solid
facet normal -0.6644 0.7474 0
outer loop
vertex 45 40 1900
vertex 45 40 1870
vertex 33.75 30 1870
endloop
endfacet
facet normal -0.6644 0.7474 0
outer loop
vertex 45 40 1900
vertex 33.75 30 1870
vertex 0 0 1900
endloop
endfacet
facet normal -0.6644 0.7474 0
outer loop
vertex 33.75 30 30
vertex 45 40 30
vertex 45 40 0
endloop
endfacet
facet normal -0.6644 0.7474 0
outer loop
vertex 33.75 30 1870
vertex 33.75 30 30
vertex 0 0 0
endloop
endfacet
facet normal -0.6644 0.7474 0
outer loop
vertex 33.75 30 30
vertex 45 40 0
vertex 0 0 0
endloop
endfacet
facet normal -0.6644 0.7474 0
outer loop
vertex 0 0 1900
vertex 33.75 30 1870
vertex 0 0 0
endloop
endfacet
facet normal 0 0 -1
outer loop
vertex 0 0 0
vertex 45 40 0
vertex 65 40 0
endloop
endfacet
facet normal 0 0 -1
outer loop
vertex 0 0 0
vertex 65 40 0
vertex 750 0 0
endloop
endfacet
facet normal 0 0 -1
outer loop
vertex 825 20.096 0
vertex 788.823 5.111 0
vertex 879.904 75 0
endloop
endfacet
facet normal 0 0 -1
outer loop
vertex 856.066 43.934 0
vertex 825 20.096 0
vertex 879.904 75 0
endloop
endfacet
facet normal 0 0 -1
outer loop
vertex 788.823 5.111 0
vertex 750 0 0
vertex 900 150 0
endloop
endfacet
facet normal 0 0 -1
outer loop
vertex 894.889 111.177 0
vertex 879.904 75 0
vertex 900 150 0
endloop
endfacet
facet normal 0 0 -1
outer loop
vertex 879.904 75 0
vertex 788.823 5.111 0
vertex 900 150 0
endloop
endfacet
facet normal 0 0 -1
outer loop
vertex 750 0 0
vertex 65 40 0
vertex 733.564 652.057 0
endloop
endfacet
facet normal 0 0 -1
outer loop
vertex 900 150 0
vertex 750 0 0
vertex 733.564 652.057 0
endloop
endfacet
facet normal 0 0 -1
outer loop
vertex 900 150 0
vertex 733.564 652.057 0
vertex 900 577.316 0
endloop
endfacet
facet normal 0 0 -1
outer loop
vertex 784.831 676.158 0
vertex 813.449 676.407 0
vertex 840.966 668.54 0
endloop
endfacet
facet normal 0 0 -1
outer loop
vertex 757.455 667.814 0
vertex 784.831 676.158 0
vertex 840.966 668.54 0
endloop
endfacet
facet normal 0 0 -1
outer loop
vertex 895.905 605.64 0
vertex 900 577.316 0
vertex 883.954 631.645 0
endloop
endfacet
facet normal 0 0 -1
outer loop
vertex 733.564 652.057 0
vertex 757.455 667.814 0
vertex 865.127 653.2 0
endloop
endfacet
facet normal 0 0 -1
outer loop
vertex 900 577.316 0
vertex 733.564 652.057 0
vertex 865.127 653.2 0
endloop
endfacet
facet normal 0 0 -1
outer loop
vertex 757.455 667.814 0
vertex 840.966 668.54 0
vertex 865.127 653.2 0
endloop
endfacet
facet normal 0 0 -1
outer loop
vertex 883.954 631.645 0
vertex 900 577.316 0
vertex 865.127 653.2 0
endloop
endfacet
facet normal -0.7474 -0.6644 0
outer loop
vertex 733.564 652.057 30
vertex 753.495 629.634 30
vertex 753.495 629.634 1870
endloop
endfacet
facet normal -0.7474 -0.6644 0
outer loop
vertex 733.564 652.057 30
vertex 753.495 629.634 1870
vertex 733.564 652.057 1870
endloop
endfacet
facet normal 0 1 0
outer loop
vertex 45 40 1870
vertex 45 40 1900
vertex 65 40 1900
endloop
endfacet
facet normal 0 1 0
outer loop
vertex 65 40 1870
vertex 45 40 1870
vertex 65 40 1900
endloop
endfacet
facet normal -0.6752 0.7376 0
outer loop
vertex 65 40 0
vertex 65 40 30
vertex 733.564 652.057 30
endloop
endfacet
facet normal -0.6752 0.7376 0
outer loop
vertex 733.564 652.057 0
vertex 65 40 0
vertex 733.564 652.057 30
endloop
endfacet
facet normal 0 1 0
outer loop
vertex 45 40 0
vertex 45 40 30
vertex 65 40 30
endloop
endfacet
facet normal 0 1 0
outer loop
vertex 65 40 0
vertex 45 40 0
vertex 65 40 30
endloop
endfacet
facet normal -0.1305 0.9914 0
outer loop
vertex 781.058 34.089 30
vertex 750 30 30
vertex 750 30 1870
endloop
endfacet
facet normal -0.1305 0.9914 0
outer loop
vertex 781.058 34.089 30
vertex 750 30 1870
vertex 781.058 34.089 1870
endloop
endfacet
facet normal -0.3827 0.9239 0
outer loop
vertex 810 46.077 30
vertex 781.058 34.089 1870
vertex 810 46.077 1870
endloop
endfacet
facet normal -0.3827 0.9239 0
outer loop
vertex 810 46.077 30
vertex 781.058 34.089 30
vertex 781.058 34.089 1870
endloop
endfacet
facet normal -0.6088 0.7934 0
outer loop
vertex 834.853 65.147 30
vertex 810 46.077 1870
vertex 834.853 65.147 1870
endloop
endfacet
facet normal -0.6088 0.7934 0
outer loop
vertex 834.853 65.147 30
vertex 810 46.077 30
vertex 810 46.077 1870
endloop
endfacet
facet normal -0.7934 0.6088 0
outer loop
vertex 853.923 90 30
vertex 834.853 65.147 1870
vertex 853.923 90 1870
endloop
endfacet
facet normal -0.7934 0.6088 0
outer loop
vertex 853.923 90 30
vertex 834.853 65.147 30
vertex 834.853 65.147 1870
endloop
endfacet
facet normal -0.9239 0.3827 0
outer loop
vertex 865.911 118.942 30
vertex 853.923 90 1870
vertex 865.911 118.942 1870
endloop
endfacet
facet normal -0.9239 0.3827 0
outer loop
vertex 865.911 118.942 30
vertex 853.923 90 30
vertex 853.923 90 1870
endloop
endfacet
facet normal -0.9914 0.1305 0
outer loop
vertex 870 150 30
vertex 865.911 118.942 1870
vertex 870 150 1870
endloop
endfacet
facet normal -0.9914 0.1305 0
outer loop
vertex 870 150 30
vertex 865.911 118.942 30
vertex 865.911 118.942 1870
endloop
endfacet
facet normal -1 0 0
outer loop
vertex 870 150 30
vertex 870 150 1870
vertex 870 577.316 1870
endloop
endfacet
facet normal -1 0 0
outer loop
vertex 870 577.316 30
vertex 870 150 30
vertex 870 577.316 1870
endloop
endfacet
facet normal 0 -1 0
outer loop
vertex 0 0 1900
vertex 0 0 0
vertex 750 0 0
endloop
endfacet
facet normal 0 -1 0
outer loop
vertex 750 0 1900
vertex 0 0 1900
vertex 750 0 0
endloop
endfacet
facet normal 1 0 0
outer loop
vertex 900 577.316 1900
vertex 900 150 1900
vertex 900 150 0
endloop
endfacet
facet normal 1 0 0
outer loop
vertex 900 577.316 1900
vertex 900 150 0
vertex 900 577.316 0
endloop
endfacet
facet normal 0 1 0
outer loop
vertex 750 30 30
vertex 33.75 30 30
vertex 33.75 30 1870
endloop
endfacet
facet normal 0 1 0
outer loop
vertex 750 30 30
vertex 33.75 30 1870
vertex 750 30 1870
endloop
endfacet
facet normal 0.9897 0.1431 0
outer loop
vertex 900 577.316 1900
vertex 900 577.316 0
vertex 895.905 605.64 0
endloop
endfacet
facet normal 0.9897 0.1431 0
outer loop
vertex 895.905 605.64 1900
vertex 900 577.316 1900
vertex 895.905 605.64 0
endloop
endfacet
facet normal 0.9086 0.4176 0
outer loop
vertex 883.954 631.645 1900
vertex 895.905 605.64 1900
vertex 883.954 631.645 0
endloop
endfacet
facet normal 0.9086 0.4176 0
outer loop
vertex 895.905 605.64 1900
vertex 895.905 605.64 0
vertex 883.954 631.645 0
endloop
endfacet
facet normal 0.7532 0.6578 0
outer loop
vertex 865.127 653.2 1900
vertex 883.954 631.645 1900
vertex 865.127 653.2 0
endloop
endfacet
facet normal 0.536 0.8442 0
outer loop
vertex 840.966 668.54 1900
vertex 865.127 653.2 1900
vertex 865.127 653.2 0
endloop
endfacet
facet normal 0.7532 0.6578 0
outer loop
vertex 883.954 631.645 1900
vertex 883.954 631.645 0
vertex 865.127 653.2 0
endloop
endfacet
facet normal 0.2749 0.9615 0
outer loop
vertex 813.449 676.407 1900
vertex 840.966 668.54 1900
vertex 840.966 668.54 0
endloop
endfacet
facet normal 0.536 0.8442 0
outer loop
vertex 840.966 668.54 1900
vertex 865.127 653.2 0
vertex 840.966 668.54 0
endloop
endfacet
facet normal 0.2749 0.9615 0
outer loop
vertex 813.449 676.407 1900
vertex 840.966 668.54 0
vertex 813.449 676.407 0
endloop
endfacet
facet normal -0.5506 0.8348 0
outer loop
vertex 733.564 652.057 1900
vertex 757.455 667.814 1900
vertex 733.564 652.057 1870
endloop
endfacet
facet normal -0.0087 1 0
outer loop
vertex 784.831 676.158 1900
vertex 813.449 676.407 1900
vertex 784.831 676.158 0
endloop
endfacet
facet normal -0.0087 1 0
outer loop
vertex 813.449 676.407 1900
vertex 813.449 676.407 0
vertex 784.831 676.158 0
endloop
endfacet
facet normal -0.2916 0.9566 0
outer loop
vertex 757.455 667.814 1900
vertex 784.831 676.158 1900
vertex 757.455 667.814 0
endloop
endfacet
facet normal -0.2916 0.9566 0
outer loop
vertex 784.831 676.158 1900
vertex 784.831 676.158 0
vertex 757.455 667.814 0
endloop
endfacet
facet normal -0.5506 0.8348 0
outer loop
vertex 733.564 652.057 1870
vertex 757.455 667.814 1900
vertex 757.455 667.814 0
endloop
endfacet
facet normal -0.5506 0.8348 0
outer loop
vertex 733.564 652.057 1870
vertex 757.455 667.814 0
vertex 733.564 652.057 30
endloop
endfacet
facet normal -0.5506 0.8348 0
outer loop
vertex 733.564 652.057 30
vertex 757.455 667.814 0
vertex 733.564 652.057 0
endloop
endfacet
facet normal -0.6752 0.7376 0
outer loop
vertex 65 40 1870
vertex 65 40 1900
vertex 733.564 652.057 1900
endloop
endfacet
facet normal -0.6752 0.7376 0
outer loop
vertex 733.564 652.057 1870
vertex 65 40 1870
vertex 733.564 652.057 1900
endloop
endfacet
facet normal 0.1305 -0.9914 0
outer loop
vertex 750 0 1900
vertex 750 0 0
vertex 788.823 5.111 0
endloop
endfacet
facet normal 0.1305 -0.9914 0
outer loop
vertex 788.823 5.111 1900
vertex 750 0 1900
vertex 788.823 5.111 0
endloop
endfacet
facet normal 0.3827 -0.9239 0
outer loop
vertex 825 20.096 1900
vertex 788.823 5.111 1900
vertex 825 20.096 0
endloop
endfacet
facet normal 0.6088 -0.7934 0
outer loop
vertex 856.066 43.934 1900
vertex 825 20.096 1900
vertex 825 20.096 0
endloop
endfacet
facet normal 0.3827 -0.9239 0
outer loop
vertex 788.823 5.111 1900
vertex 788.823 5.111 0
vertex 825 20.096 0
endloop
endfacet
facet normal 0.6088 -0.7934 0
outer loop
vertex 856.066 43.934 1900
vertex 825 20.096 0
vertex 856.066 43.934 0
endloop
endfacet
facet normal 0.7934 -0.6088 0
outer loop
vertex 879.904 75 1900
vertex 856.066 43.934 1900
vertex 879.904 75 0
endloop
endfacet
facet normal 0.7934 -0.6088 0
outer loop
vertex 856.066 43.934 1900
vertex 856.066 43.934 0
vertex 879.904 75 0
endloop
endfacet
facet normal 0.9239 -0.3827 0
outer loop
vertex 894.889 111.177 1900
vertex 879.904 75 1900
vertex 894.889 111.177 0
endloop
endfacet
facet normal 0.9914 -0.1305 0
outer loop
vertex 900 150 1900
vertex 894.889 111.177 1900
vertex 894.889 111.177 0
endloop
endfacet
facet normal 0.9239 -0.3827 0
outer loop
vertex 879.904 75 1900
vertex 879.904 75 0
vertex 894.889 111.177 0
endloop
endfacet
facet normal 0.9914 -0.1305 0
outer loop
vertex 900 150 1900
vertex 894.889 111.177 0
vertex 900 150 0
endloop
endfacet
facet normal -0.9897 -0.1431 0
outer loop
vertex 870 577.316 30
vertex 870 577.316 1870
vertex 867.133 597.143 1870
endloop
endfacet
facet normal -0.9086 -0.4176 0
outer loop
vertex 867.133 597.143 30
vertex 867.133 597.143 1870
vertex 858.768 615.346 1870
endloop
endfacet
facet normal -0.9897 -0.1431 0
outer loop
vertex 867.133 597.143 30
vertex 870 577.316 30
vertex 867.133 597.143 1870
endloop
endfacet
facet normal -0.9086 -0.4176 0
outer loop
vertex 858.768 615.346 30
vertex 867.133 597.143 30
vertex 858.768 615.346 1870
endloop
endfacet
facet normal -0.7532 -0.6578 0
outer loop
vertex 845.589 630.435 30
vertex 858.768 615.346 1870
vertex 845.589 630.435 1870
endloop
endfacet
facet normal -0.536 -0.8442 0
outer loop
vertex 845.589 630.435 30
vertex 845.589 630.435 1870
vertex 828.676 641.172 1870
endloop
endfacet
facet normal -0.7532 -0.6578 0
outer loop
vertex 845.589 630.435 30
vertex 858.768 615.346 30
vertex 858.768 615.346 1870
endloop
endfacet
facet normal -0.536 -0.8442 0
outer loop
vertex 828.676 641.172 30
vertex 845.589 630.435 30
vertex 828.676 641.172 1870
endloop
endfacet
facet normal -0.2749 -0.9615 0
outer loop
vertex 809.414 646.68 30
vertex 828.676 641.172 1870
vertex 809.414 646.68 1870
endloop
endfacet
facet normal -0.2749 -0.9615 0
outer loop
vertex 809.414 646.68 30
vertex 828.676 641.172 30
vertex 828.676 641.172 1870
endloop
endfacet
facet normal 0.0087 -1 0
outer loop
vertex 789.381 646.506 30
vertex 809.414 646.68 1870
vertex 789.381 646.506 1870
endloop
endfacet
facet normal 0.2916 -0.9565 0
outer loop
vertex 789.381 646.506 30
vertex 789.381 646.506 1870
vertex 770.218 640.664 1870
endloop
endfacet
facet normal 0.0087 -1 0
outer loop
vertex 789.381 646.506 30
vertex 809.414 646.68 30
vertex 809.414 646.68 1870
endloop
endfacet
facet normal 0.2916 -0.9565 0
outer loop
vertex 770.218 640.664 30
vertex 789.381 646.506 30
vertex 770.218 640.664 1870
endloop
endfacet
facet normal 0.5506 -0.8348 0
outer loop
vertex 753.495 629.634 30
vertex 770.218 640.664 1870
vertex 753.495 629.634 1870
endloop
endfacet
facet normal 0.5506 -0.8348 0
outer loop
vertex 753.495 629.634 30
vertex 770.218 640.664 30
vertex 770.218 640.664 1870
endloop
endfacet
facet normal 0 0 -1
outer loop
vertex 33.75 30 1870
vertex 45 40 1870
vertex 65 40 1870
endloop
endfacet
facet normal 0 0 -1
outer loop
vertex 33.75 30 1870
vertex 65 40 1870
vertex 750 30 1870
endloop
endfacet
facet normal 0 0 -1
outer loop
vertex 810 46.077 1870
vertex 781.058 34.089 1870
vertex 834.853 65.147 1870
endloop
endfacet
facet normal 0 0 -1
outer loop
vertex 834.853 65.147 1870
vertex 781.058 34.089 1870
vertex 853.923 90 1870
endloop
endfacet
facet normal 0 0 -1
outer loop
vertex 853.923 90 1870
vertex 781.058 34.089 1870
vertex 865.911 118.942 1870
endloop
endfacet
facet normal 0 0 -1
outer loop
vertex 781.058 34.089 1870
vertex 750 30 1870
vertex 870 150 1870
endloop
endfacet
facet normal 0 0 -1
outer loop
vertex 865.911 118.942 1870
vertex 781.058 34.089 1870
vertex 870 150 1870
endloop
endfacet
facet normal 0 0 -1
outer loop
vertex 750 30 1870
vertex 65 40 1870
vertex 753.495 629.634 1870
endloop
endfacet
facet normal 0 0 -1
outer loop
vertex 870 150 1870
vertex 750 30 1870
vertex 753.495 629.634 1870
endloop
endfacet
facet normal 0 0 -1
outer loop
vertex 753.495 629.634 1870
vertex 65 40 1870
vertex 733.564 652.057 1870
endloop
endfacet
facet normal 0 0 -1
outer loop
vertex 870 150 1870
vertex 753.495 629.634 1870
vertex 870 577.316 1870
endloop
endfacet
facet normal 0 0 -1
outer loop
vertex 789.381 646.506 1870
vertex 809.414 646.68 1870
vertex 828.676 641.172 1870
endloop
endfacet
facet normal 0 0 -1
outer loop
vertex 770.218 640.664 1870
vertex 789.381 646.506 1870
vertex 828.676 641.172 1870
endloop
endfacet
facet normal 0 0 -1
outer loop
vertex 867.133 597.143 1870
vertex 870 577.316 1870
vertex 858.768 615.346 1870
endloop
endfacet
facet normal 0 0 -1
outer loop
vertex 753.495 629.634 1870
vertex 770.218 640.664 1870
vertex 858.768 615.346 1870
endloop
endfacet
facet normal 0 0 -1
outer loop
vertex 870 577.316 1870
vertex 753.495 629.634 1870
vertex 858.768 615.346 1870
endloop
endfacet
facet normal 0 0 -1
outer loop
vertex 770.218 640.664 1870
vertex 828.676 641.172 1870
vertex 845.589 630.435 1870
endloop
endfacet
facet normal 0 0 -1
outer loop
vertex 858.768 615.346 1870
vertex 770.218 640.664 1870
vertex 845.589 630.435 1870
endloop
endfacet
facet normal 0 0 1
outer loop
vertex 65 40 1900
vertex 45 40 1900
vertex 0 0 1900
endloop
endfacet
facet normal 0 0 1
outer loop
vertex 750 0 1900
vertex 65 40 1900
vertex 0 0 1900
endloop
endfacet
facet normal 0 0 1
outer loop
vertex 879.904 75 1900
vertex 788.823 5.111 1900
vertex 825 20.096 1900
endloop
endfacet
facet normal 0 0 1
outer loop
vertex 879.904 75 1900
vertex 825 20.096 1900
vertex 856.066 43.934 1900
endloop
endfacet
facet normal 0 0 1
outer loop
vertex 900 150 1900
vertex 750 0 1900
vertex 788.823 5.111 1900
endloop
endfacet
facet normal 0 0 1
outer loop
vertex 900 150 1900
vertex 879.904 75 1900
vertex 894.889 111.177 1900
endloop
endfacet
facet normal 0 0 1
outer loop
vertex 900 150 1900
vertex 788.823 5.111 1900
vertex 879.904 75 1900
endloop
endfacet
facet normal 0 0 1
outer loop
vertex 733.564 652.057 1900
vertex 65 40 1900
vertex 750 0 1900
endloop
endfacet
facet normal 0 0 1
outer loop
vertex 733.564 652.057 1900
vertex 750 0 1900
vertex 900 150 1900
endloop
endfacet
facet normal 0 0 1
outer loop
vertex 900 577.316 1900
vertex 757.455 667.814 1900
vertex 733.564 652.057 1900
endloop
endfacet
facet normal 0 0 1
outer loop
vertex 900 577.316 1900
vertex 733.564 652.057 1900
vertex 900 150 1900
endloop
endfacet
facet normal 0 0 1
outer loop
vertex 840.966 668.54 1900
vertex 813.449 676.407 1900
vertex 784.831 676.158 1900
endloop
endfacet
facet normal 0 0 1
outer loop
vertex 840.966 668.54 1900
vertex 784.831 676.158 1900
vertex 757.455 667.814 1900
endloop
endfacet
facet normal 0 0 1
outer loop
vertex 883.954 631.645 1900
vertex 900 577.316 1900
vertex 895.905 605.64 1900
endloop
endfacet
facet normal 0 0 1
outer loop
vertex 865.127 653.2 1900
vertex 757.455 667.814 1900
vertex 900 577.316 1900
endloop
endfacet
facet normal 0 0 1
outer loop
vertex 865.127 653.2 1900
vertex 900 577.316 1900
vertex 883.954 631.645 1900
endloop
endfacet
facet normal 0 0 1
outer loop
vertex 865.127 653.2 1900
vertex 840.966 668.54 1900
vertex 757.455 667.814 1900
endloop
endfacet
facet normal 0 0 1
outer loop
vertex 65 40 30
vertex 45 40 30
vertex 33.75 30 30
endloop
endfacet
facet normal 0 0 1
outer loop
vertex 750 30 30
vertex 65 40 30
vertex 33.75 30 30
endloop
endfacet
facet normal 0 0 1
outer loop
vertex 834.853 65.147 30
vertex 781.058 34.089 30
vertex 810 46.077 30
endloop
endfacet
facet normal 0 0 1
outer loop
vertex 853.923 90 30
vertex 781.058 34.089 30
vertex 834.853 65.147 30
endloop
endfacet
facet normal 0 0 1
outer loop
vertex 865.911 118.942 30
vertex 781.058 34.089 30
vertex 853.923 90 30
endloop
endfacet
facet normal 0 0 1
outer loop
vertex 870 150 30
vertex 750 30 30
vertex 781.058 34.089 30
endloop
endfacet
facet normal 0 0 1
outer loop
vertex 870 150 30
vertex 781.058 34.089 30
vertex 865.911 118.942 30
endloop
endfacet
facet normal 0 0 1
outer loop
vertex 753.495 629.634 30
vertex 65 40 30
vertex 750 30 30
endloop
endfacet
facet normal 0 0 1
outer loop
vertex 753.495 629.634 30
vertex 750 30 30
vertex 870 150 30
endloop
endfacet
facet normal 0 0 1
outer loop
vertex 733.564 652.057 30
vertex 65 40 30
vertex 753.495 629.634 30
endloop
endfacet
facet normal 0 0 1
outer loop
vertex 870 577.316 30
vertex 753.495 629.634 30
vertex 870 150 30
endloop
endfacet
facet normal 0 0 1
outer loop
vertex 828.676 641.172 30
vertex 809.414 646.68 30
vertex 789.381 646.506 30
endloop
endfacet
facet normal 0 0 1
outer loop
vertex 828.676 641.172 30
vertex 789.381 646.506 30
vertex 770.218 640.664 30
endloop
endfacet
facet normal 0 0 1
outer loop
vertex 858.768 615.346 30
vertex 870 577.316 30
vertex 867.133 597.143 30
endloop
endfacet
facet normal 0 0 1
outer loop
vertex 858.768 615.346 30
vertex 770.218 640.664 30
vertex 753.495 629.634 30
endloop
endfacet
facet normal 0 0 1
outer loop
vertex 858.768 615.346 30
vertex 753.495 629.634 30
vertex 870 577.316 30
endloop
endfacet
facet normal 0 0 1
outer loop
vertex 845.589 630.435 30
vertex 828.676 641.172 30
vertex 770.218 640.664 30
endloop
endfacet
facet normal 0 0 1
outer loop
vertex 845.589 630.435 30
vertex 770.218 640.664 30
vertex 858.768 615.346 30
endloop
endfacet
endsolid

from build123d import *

# Parameters (mm, degrees)
BOSS_EXTRUDE1_DEPTH = 1900
SHELL1_START        = 30
SHELL1_DEPTH        = 1840
CUT_EXTRUDE1_DEPTH  = 2209.790719691


# Read off the part's stored shape, not the designer's step: Shell1
with BuildPart() as part:
    # Sketch2 → Boss-Extrude1 (new body)
    with BuildSketch(Plane.XY):
        with BuildLine():
            Line((0, 0), (750, 0))
            ThreePointArc((750, 0), (856.066017178, 43.933982822), (900, 150))
            Line((900, 150), (900, 577.315615791))
            ThreePointArc((900, 577.315615791), (840.965605157, 668.539621372), (733.563616117, 652.05654766))
            Line((733.563616117, 652.05654766), (0, 0))
        make_face()
    extrude(amount=BOSS_EXTRUDE1_DEPTH)

    # Shell1 outline → Shell1 (cut)
    with BuildSketch(Plane.XY.offset(SHELL1_START)):
        with BuildLine():
            Line((753.494531282, 629.634268099), (733.563616117, 652.05654766))
            Line((733.563616117, 652.05654766), (33.75, 30))
            Line((33.75, 30), (750, 30))
            ThreePointArc((750, 30), (834.852813742, 65.147186258), (870, 150))
            Line((870, 150), (870, 577.315615791))
            ThreePointArc((870, 577.315615791), (828.67592361, 641.172419698), (753.494531282, 629.634268099))
        make_face()
    extrude(amount=SHELL1_DEPTH, mode=Mode.SUBTRACT)

    # Sketch3 → Cut-Extrude1 (cut, through all)
    with BuildSketch(Plane.XY.offset(1900)):
        Polygon((45, 40), (65, 40), (733.563616117, 652.05654766), align=None)
    extrude(amount=-CUT_EXTRUDE1_DEPTH, mode=Mode.SUBTRACT)


solid = part.part
